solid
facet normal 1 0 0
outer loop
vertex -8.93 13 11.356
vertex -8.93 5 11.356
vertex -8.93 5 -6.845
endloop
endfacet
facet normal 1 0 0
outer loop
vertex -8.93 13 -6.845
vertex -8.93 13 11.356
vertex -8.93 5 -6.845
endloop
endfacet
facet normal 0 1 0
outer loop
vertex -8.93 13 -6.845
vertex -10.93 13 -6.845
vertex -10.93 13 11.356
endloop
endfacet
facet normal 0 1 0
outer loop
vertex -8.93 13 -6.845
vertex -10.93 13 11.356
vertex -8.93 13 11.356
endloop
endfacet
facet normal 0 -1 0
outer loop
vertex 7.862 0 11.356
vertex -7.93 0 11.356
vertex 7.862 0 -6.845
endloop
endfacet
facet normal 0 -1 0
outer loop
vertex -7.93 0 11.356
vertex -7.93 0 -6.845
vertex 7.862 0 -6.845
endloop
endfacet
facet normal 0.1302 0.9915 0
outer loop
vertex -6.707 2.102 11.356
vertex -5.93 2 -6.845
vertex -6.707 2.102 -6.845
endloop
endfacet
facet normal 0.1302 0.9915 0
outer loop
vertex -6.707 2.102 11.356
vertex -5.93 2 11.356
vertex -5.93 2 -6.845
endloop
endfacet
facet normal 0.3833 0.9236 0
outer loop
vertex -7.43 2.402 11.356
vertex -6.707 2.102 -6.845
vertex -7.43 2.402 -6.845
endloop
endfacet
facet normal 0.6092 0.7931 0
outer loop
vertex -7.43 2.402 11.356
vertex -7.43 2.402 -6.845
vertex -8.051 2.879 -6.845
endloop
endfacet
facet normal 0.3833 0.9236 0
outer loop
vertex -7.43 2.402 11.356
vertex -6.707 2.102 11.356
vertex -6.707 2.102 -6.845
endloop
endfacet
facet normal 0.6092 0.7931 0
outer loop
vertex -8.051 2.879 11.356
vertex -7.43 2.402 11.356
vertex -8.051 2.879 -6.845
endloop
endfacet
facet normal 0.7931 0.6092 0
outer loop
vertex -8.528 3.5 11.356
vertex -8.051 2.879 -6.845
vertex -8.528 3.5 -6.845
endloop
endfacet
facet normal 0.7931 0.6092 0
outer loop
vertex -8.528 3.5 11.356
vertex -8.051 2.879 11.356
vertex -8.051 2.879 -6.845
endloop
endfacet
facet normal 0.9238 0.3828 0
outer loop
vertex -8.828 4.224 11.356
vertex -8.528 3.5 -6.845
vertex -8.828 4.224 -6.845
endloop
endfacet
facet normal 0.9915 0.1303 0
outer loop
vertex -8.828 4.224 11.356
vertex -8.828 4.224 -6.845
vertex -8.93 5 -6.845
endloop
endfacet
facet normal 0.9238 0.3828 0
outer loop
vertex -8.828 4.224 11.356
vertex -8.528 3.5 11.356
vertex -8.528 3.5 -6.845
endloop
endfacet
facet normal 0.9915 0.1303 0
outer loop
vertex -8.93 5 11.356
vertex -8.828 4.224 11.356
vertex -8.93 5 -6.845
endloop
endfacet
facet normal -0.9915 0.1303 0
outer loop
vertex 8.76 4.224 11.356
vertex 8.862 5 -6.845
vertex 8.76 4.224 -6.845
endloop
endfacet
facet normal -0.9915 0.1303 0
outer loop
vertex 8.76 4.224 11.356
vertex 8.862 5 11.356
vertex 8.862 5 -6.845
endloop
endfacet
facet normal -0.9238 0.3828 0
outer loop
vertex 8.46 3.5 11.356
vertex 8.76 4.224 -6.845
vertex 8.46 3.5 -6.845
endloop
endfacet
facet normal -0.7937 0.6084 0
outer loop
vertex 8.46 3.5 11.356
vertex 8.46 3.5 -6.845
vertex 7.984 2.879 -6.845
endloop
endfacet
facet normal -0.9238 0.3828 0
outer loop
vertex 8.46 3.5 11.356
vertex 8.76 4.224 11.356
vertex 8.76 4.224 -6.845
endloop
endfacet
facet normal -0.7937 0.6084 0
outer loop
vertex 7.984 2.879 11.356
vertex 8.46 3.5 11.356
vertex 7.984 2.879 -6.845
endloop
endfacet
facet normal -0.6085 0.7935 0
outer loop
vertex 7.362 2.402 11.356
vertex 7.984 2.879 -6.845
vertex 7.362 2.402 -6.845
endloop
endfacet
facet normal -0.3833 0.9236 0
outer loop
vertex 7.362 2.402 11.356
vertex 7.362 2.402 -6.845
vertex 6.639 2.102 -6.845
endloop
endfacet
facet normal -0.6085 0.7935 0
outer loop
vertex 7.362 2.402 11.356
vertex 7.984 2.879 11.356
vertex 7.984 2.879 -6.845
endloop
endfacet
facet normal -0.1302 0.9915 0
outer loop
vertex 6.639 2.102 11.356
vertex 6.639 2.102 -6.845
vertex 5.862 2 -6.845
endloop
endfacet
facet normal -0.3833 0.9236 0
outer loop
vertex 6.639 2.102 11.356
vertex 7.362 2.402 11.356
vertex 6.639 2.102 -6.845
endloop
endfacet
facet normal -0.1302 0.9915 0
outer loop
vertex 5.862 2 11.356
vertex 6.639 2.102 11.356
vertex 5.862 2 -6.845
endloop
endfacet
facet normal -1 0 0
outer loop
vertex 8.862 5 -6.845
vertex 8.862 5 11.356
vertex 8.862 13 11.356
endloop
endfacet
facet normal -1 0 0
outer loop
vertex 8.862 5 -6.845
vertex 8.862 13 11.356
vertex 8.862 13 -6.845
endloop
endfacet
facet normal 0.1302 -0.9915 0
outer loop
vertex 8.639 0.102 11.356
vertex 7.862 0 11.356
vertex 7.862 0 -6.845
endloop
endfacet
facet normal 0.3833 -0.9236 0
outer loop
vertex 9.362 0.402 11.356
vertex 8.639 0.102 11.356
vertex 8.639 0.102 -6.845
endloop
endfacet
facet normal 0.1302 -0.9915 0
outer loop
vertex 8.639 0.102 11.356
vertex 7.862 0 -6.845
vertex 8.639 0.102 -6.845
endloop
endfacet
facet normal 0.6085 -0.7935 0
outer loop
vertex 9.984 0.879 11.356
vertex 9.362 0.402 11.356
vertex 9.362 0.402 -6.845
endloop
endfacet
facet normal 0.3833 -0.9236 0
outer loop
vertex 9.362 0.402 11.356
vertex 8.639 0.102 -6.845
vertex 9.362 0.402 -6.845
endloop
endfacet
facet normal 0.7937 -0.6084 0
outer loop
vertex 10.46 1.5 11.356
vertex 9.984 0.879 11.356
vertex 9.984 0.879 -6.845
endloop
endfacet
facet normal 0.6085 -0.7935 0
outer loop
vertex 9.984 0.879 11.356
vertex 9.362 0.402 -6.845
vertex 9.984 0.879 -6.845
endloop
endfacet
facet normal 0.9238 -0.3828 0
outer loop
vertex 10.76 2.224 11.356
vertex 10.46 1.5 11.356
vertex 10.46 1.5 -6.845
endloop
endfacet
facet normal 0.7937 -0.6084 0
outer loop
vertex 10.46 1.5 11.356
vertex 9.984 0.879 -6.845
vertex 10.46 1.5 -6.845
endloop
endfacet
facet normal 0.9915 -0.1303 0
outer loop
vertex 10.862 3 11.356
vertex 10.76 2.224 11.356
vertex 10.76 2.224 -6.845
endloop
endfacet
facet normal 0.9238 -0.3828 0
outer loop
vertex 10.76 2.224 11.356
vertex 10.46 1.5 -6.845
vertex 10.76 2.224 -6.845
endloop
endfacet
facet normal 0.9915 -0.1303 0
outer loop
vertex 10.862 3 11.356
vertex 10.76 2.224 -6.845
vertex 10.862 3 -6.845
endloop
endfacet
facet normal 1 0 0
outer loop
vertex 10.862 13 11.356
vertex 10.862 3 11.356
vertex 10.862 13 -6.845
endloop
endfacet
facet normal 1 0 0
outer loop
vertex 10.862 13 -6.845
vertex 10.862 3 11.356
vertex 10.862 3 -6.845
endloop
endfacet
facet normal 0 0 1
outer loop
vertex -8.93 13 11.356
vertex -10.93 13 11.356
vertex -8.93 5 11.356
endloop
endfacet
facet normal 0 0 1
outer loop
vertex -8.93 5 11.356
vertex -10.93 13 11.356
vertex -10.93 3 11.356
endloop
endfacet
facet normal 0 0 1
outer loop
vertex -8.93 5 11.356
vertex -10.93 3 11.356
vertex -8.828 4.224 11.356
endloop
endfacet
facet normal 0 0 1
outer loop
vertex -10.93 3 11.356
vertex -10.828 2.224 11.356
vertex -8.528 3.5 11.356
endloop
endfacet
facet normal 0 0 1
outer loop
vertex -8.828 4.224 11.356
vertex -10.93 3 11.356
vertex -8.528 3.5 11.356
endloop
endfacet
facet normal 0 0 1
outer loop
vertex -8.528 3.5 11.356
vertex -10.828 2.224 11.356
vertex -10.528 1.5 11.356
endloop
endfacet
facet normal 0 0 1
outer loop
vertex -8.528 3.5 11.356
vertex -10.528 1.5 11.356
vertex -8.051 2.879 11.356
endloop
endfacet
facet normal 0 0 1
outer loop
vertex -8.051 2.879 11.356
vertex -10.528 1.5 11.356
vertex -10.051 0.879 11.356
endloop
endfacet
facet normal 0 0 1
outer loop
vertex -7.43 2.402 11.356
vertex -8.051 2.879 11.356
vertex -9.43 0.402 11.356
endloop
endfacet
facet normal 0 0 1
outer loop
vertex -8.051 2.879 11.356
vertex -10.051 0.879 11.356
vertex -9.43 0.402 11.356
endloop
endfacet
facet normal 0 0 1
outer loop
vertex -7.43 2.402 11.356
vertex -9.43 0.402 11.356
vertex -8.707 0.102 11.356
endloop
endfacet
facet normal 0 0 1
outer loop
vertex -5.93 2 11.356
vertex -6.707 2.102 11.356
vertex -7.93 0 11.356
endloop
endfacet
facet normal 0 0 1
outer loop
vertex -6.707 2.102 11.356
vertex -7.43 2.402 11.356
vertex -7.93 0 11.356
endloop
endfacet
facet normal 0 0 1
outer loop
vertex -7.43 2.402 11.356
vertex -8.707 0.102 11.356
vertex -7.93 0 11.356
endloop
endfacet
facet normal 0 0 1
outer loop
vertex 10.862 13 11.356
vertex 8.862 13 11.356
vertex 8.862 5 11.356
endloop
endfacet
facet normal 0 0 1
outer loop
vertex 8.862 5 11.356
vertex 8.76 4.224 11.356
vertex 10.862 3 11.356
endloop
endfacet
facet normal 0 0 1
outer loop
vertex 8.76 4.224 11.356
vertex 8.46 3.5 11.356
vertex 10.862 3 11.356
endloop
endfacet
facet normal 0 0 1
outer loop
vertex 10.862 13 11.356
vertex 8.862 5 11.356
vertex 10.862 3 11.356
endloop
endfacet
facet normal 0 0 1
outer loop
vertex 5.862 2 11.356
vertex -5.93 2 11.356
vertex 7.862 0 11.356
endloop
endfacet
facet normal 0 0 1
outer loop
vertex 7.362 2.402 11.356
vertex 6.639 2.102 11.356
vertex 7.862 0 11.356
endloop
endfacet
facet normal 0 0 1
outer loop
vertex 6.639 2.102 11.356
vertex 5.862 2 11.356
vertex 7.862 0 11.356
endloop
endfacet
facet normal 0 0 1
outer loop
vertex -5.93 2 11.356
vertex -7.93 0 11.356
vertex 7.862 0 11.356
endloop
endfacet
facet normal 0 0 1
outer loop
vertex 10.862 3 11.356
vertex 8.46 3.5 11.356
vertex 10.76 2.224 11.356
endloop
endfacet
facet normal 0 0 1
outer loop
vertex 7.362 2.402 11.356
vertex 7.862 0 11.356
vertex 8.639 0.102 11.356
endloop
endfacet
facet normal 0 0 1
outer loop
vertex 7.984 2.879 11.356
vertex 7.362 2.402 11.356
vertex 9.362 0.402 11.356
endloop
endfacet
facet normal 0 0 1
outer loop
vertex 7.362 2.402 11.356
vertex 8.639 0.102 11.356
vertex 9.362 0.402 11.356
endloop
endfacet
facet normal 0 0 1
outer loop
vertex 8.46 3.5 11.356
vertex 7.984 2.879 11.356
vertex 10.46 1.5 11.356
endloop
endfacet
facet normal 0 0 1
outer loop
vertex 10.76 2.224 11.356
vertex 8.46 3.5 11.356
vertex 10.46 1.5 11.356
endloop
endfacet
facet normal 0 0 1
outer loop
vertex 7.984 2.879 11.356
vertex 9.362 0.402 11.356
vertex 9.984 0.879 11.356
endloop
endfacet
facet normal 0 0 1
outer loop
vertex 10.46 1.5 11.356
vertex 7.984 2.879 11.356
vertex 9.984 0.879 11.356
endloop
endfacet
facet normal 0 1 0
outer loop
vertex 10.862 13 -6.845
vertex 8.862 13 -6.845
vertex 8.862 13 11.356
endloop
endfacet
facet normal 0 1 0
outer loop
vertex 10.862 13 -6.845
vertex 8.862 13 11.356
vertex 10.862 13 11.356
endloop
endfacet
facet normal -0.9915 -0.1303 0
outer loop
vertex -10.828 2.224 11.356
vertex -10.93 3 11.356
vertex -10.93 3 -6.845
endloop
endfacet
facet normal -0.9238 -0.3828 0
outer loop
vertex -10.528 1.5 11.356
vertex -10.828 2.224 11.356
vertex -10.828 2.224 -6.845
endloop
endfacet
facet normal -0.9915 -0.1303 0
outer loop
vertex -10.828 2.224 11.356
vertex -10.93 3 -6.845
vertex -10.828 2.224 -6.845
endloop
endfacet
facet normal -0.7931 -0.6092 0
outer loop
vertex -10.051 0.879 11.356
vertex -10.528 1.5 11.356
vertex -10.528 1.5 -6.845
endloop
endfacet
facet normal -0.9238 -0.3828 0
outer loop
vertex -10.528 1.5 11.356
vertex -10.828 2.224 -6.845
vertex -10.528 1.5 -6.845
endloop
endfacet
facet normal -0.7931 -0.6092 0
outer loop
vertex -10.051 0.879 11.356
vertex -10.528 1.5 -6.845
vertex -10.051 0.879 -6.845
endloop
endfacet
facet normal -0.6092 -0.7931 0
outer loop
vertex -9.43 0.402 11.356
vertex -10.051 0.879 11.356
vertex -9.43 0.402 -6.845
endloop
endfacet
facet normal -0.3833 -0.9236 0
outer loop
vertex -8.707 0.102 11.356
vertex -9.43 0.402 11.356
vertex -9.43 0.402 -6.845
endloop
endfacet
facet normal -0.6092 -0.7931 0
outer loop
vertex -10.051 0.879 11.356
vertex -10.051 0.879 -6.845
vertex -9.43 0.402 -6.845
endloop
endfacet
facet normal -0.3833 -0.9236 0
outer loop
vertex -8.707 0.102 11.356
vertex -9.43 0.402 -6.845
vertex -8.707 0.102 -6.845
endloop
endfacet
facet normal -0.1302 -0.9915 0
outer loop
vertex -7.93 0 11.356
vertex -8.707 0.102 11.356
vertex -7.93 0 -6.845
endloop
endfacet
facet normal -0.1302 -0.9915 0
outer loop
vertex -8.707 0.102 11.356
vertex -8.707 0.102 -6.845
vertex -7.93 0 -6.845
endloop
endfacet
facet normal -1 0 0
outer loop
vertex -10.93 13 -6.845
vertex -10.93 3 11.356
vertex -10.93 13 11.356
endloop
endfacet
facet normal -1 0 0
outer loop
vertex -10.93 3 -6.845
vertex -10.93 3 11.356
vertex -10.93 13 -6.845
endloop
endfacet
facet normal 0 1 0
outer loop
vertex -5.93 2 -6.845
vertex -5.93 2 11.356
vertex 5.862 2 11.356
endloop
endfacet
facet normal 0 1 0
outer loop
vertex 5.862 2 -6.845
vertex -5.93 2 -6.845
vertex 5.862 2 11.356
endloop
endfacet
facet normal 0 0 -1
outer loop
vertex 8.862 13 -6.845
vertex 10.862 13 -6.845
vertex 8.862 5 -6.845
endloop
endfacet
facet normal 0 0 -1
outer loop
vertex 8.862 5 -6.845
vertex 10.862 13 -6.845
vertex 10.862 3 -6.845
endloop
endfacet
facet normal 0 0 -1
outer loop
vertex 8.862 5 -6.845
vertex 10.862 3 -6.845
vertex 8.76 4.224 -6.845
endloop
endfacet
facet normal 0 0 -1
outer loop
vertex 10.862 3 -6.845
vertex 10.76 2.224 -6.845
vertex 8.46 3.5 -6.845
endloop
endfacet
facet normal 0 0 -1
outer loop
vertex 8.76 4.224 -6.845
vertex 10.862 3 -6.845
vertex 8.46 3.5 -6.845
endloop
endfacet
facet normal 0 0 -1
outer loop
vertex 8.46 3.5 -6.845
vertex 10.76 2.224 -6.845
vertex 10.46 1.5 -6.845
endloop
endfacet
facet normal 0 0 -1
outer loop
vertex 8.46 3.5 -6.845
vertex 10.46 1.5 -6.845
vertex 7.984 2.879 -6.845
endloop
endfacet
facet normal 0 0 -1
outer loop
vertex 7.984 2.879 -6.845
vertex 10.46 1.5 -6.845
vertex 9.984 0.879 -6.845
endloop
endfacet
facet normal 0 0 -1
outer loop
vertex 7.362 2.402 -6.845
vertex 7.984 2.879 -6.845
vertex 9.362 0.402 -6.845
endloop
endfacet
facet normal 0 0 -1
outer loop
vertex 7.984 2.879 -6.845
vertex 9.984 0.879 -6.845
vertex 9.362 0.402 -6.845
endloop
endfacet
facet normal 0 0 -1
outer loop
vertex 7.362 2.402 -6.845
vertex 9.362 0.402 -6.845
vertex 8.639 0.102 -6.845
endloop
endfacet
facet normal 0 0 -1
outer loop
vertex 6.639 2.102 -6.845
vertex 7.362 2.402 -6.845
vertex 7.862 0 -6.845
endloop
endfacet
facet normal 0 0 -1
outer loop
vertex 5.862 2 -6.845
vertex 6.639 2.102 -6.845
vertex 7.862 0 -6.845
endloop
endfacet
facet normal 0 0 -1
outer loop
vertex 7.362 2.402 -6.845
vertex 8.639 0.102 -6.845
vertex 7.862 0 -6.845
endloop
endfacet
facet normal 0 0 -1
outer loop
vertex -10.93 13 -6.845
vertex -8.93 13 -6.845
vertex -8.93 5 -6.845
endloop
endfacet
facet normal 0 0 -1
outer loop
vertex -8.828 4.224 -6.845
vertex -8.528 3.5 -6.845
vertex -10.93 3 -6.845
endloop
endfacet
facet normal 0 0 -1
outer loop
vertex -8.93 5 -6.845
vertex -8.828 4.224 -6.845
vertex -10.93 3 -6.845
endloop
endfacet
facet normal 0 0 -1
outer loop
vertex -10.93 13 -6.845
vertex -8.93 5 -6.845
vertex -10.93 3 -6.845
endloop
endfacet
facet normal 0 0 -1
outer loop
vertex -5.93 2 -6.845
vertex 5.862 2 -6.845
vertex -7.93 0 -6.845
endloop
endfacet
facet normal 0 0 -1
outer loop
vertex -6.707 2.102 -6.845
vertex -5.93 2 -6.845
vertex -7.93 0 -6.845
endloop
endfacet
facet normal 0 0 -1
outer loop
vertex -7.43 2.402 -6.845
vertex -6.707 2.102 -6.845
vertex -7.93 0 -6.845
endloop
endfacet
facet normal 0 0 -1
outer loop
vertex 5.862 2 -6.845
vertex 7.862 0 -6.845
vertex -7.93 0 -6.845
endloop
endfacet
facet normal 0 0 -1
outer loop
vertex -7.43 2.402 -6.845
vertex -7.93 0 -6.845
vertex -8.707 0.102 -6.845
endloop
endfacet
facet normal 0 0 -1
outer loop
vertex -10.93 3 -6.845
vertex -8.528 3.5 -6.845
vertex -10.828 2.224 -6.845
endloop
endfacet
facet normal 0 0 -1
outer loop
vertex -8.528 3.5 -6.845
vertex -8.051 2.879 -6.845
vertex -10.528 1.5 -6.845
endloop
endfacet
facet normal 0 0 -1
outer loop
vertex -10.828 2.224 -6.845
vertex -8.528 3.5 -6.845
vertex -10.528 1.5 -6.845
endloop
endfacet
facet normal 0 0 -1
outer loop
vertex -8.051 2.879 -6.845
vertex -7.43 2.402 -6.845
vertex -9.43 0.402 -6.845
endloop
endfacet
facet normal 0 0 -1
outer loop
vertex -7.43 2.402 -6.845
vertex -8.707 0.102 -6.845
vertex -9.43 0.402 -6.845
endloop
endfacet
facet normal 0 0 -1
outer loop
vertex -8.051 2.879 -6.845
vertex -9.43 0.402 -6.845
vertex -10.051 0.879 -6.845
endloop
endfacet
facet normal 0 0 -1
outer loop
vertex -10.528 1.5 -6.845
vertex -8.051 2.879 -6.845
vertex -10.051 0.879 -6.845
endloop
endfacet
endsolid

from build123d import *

# Parameters (mm, degrees)
SKETCH1_W           = 21.792403666
SKETCH1_H           = 18.201033873
BOSS_EXTRUDE1_DEPTH = 2
SKETCH1_3_W         = 2
SKETCH1_3_H         = 18.201033873
BOSS_EXTRUDE2_DEPTH = 13
FILLET1_R           = 3


with BuildPart() as part:
    # Sketch1 → Boss-Extrude1 (new body)
    with BuildSketch(Plane(origin=(0, 0, 0), x_dir=(1, 0, 0), z_dir=(0, 1, 0))):
        with Locations((-0.033894989, -2.255649147)):
            Rectangle(SKETCH1_W, SKETCH1_H)
    extrude(amount=BOSS_EXTRUDE1_DEPTH)

    # Sketch1<3> → Boss-Extrude2 (add)
    with BuildSketch(Plane(origin=(0, 0, 0), x_dir=(1, 0, 0), z_dir=(0, 1, 0))):
        with Locations((-9.930096822, -2.255649147)):
            Rectangle(SKETCH1_3_W, SKETCH1_3_H)
        with Locations((9.862306844, -2.255649147)):
            Rectangle(SKETCH1_3_W, SKETCH1_3_H)
    extrude(amount=BOSS_EXTRUDE2_DEPTH)

    # Fillet1
    fillet1_edges = [part.edges().sort_by_distance(p)[0] for p in [
        (-10.930096822, 0, 2.255649147),
        (10.862306844, 0, 2.255649147),
        (-8.930096822, 2, 2.255649147),
        (8.862306844, 2, 2.255649147),
    ]]
    fillet(fillet1_edges, radius=FILLET1_R)


solid = part.part
